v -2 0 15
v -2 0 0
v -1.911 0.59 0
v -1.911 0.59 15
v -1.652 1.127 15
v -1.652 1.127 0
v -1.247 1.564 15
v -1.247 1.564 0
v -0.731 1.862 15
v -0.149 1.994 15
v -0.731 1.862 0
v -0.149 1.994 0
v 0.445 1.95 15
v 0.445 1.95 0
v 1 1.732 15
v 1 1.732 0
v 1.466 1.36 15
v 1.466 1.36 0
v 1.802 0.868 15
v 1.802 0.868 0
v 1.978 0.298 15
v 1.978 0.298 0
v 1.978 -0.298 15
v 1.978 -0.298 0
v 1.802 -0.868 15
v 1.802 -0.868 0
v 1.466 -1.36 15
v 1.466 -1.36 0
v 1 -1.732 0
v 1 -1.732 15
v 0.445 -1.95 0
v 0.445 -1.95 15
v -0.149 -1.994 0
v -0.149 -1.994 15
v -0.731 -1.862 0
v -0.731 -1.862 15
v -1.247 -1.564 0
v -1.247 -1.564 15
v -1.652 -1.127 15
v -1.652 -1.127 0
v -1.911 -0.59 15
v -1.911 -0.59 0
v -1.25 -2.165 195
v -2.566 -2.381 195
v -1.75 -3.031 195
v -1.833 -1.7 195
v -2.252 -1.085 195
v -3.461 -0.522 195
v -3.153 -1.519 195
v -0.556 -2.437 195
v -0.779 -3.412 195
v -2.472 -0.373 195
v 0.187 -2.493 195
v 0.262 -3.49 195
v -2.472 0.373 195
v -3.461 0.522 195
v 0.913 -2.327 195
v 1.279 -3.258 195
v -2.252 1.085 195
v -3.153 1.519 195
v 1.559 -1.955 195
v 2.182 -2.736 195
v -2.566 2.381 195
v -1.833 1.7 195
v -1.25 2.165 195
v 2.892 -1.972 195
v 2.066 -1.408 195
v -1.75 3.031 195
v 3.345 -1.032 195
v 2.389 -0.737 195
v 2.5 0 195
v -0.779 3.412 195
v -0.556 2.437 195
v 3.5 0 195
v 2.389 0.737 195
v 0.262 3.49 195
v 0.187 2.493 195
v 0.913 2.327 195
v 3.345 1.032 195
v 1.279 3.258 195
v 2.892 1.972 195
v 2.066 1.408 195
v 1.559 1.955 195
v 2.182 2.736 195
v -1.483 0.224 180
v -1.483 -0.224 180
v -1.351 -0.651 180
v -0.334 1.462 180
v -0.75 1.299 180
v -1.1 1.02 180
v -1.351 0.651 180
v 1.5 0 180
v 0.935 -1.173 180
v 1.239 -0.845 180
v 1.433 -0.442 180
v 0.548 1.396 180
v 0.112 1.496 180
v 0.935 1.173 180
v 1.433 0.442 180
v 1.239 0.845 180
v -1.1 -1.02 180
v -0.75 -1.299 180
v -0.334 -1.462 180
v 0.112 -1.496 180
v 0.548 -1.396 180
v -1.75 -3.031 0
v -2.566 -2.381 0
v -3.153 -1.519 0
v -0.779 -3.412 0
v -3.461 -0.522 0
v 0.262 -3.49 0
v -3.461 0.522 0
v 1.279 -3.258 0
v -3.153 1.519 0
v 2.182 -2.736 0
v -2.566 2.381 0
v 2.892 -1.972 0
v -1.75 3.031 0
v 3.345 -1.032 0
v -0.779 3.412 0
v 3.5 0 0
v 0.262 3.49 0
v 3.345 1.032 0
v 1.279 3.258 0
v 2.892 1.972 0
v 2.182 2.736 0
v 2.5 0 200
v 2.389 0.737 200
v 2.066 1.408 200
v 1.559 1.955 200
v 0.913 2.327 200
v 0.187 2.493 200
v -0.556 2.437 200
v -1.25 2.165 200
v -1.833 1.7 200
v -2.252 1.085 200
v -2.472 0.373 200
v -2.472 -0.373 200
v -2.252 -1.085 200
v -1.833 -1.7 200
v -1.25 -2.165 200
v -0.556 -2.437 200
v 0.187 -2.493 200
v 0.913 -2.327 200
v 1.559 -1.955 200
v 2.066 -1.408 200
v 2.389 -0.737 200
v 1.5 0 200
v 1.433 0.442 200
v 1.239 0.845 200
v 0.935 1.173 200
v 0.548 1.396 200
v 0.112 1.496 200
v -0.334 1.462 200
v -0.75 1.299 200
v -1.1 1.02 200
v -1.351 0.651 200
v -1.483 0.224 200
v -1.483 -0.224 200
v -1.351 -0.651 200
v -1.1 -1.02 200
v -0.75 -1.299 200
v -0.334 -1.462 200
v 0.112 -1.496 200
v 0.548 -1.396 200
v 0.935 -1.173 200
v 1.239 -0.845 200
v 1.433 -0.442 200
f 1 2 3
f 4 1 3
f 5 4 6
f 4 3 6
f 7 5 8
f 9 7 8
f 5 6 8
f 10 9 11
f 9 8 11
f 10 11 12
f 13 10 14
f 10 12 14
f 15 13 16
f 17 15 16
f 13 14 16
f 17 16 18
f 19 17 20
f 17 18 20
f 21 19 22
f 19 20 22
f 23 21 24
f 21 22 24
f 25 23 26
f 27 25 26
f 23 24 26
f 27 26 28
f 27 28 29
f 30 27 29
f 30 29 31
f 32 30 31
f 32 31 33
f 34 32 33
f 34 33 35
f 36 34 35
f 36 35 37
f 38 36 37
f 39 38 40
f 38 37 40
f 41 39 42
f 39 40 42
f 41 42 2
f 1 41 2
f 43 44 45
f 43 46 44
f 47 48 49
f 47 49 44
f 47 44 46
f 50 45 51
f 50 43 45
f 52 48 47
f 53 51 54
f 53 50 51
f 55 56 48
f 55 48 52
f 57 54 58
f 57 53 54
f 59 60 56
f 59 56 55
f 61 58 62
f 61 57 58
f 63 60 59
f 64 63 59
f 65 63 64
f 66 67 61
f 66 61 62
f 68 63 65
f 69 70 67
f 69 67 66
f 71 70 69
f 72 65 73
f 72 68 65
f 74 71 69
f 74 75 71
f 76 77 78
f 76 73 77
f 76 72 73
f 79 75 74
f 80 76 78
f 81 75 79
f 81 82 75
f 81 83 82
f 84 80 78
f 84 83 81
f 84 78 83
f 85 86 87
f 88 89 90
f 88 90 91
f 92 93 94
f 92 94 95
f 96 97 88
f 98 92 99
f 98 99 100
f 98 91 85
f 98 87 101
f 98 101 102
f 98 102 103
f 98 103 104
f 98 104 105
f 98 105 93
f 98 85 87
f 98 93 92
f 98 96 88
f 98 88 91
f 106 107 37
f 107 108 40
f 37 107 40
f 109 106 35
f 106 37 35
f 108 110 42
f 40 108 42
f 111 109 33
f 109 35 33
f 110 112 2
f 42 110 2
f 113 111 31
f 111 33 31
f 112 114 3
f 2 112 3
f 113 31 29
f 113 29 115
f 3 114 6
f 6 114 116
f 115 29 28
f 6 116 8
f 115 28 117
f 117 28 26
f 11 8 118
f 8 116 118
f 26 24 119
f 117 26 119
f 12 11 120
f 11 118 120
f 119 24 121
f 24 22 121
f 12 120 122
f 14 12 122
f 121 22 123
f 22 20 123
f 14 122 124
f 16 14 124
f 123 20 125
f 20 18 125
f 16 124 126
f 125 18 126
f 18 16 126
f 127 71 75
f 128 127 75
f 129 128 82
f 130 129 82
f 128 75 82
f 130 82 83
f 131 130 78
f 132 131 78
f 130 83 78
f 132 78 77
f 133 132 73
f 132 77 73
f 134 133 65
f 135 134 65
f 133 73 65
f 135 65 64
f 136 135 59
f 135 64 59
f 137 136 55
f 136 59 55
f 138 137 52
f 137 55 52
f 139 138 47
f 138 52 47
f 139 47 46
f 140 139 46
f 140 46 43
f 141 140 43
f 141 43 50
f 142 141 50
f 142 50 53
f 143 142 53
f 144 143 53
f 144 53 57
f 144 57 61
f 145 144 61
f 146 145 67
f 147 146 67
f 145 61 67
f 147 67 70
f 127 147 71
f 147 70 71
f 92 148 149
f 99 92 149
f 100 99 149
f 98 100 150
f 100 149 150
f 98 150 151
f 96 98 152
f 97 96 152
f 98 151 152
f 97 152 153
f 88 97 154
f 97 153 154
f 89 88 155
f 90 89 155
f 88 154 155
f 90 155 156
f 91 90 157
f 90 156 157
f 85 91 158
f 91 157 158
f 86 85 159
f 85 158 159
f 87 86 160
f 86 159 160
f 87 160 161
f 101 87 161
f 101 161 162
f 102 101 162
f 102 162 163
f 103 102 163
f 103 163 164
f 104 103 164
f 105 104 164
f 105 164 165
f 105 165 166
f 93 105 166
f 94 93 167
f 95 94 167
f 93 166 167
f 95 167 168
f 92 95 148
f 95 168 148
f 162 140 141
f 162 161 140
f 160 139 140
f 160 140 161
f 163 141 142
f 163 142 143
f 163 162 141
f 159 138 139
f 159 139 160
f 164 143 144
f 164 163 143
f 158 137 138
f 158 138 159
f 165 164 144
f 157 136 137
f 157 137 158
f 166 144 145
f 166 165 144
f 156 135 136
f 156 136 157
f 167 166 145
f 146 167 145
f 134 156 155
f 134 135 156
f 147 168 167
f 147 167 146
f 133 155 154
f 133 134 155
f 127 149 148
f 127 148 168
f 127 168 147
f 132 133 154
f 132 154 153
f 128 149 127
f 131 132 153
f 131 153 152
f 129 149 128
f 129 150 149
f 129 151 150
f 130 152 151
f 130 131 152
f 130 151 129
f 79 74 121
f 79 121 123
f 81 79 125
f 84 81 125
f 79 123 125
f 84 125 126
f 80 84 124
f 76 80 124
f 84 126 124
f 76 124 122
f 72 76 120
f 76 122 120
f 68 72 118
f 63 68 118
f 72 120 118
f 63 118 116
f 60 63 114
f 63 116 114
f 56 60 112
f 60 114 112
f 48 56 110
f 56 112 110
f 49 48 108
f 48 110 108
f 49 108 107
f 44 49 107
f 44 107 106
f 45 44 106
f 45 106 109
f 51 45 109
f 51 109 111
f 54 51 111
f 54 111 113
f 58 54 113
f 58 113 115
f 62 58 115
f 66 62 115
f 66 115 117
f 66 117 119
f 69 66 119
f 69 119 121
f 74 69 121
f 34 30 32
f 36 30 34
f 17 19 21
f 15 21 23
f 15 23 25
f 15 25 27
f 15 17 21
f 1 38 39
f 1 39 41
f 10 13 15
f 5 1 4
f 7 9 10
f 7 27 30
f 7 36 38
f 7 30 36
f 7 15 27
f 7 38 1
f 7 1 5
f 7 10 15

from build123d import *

# Parameters (mm, degrees)
SKETCH1_R           = 3.5
BOSS_EXTRUDE1_DEPTH = 200
SKETCH2_R           = 2
CUT_EXTRUDE1_DEPTH  = 15
CUT_EXTRUDE2_START  = -5
SKETCH3_R           = 3.5
SKETCH3_R_2         = 2.5
CUT_EXTRUDE2_DEPTH  = 5
SKETCH4_R           = 1.5
CUT_EXTRUDE3_DEPTH  = 20


with BuildPart() as part:
    # Sketch1 → Boss-Extrude1 (new body)
    with BuildSketch(Plane.XY):
        Circle(SKETCH1_R)
    extrude(amount=BOSS_EXTRUDE1_DEPTH)

    # Sketch2 → Cut-Extrude1 (cut)
    with BuildSketch(Plane(origin=(0, 0, 0), x_dir=(-1, 0, 0), z_dir=(0, 0, -1))):
        Circle(SKETCH2_R)
    extrude(amount=-CUT_EXTRUDE1_DEPTH, mode=Mode.SUBTRACT)

    # Sketch3 → Cut-Extrude2 (cut)
    with BuildSketch(Plane.XY.offset(200).offset(CUT_EXTRUDE2_START)):
        Circle(SKETCH3_R)
        Circle(SKETCH3_R_2, mode=Mode.SUBTRACT)
    extrude(amount=CUT_EXTRUDE2_DEPTH, mode=Mode.SUBTRACT)

    # Sketch4 → Cut-Extrude3 (cut)
    with BuildSketch(Plane.XY.offset(200)):
        Circle(SKETCH4_R)
    extrude(amount=-CUT_EXTRUDE3_DEPTH, mode=Mode.SUBTRACT)


solid = part.part
